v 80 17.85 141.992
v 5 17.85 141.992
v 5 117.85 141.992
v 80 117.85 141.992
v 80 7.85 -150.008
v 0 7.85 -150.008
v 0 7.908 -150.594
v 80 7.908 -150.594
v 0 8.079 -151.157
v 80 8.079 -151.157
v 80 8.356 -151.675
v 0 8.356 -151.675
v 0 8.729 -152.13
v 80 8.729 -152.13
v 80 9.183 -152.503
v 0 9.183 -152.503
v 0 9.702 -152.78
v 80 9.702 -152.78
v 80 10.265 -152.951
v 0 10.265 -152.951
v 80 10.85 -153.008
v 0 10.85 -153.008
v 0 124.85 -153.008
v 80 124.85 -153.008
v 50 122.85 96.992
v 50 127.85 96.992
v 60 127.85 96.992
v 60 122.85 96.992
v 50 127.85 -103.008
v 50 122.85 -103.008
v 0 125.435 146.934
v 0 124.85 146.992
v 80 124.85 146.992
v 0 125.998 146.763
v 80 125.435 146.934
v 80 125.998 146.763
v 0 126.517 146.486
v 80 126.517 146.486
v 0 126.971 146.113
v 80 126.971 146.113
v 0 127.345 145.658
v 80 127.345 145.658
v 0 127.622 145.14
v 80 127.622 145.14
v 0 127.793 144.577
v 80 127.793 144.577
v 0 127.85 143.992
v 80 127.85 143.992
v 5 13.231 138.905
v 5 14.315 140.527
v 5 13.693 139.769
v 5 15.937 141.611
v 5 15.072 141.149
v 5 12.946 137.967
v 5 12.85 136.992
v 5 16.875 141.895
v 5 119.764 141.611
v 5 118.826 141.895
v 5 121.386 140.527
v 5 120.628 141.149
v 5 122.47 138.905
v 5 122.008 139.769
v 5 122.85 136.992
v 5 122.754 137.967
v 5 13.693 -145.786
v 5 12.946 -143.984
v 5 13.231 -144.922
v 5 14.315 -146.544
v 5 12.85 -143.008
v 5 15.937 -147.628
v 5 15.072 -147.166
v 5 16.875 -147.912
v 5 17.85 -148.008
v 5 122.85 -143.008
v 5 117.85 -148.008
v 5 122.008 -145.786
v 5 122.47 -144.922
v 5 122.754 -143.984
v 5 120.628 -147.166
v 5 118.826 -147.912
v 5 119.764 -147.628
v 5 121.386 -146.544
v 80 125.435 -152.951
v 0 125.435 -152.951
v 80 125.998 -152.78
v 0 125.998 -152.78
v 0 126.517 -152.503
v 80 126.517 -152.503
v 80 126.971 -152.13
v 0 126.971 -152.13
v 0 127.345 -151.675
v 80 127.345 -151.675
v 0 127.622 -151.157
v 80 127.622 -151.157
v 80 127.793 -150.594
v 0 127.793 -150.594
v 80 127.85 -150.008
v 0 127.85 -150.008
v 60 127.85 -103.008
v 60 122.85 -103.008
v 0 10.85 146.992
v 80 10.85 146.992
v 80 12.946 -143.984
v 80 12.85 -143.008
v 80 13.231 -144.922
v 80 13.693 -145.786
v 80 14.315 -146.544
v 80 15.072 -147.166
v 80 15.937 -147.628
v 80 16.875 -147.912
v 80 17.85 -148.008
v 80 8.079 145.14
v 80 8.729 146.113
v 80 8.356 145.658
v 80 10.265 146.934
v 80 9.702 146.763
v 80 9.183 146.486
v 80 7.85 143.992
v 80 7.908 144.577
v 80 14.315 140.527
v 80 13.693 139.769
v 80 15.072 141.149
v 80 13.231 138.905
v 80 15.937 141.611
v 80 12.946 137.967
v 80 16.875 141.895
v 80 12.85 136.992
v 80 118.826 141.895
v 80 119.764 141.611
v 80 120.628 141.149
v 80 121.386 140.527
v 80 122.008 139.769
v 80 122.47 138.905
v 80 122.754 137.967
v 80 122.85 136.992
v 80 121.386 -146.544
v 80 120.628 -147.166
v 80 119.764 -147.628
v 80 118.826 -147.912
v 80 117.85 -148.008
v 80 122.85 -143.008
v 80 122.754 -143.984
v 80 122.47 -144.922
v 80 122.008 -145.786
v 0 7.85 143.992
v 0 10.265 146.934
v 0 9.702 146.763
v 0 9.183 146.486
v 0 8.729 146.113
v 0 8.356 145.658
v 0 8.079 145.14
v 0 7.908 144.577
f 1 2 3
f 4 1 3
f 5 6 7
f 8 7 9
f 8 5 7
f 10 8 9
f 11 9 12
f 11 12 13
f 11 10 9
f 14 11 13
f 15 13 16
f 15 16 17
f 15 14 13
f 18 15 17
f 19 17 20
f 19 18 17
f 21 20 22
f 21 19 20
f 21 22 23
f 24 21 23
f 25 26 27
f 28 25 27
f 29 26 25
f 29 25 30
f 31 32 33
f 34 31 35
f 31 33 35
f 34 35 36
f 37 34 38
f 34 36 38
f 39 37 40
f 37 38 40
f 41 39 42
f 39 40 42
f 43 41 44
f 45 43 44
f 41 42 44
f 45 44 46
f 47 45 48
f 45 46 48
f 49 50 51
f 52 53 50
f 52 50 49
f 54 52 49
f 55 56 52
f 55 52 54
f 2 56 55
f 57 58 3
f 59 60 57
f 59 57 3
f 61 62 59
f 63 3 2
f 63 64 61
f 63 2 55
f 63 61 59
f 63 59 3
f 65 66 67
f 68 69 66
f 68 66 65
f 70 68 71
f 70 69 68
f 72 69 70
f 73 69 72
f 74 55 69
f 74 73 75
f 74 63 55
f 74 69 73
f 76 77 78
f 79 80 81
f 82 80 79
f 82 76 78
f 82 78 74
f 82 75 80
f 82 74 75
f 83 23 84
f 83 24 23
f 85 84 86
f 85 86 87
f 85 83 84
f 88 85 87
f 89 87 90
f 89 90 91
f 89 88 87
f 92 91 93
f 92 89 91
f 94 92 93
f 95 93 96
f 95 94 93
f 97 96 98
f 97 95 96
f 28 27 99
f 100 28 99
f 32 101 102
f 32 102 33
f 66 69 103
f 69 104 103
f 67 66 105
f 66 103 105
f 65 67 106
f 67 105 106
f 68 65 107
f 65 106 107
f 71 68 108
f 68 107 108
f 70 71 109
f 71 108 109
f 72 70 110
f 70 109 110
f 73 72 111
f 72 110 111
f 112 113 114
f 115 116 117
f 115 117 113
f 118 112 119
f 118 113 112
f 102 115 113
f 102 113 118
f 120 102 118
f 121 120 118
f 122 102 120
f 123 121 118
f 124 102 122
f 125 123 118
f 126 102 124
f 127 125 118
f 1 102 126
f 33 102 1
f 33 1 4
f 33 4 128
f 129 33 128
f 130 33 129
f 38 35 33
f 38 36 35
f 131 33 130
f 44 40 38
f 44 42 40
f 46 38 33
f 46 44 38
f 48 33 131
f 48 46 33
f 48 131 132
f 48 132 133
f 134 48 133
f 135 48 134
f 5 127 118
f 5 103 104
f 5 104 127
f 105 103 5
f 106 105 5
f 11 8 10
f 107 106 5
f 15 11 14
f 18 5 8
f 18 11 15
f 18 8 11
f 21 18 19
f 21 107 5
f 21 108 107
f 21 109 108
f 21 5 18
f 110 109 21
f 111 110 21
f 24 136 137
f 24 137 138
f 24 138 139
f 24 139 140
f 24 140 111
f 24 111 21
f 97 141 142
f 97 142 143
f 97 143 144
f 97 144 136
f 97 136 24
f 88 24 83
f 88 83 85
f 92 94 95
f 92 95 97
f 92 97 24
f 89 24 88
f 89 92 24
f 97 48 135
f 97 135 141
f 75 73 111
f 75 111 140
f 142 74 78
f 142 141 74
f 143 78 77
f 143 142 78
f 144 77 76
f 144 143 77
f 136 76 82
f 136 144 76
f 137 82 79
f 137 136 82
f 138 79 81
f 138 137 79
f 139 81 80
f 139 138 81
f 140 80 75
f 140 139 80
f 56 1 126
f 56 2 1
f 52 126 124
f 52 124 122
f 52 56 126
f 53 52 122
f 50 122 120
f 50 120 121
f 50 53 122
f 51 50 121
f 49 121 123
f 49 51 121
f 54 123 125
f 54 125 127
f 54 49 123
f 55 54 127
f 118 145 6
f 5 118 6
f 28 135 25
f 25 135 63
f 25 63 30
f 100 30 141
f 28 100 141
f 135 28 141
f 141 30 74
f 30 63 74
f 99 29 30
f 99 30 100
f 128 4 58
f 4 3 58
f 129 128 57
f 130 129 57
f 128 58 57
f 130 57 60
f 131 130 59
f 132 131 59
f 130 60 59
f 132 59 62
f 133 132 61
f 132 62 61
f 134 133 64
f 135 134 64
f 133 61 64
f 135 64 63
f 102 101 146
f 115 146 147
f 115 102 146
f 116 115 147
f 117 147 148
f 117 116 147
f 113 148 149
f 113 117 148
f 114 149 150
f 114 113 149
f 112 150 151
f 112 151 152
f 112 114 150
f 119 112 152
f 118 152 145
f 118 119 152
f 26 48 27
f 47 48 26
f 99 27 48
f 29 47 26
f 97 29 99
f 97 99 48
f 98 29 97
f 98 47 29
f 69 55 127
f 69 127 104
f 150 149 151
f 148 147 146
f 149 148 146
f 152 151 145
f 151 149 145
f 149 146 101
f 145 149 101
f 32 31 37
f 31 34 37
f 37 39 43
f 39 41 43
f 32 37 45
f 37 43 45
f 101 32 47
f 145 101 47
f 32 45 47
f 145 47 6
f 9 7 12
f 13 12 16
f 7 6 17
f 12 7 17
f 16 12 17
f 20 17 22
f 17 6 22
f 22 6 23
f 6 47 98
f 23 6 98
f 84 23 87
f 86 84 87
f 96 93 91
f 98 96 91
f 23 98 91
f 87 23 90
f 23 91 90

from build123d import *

# Parameters (mm, degrees)
SKETCH_1_W          = 300
SKETCH_1_H          = 120
EXTRUDE_1_DEPTH     = 80
FILLET_1_R          = 3
SHELL_1_T           = -5
FILLET_2_R          = 5
SKETCH_3_W          = 10
SKETCH_3_H          = 200
CUT_EXTRUDE_1_DEPTH = 5


with BuildPart() as part:
    # 草图1 → 凸台-拉伸1 (new body)
    with BuildSketch(Plane(origin=(0, 0, 0), x_dir=(0, 0, -1), z_dir=(1, 0, 0))):
        with Locations((3.008457619, 67.850176247)):
            Rectangle(SKETCH_1_W, SKETCH_1_H)
    extrude(amount=EXTRUDE_1_DEPTH)

    # 圆角1
    fillet_1_edges = [part.edges().sort_by_distance(p)[0] for p in [
        (40, 127.850176247, 146.991542381),
        (40, 127.850176247, -153.008457619),
        (40, 7.850176247, -153.008457619),
        (40, 7.850176247, 146.991542381),
    ]]
    fillet(fillet_1_edges, radius=FILLET_1_R)

    # 抽壳1
    shell_1_openings = [part.faces().sort_by_distance(p)[0] for p in [
        (80, 67.850176247, -3.008457619),
    ]]
    offset(amount=SHELL_1_T, openings=shell_1_openings, kind=Kind.INTERSECTION)

    # 圆角2
    fillet_2_edges = [part.edges().sort_by_distance(p)[0] for p in [
        (42.5, 12.850176247, 141.991542381),
        (42.5, 12.850176247, -148.008457619),
        (42.5, 122.850176247, -148.008457619),
        (42.5, 122.850176247, 141.991542381),
    ]]
    fillet(fillet_2_edges, radius=FILLET_2_R)

    # 草图3 → 切除-拉伸1 (cut)
    with BuildSketch(Plane(origin=(0, 127.850176247, 0), x_dir=(1, 0, 0), z_dir=(0, 1, 0))):
        with Locations((55, 3.008457619)):
            Rectangle(SKETCH_3_W, SKETCH_3_H)
    extrude(amount=-CUT_EXTRUDE_1_DEPTH, mode=Mode.SUBTRACT)


solid = part.part
